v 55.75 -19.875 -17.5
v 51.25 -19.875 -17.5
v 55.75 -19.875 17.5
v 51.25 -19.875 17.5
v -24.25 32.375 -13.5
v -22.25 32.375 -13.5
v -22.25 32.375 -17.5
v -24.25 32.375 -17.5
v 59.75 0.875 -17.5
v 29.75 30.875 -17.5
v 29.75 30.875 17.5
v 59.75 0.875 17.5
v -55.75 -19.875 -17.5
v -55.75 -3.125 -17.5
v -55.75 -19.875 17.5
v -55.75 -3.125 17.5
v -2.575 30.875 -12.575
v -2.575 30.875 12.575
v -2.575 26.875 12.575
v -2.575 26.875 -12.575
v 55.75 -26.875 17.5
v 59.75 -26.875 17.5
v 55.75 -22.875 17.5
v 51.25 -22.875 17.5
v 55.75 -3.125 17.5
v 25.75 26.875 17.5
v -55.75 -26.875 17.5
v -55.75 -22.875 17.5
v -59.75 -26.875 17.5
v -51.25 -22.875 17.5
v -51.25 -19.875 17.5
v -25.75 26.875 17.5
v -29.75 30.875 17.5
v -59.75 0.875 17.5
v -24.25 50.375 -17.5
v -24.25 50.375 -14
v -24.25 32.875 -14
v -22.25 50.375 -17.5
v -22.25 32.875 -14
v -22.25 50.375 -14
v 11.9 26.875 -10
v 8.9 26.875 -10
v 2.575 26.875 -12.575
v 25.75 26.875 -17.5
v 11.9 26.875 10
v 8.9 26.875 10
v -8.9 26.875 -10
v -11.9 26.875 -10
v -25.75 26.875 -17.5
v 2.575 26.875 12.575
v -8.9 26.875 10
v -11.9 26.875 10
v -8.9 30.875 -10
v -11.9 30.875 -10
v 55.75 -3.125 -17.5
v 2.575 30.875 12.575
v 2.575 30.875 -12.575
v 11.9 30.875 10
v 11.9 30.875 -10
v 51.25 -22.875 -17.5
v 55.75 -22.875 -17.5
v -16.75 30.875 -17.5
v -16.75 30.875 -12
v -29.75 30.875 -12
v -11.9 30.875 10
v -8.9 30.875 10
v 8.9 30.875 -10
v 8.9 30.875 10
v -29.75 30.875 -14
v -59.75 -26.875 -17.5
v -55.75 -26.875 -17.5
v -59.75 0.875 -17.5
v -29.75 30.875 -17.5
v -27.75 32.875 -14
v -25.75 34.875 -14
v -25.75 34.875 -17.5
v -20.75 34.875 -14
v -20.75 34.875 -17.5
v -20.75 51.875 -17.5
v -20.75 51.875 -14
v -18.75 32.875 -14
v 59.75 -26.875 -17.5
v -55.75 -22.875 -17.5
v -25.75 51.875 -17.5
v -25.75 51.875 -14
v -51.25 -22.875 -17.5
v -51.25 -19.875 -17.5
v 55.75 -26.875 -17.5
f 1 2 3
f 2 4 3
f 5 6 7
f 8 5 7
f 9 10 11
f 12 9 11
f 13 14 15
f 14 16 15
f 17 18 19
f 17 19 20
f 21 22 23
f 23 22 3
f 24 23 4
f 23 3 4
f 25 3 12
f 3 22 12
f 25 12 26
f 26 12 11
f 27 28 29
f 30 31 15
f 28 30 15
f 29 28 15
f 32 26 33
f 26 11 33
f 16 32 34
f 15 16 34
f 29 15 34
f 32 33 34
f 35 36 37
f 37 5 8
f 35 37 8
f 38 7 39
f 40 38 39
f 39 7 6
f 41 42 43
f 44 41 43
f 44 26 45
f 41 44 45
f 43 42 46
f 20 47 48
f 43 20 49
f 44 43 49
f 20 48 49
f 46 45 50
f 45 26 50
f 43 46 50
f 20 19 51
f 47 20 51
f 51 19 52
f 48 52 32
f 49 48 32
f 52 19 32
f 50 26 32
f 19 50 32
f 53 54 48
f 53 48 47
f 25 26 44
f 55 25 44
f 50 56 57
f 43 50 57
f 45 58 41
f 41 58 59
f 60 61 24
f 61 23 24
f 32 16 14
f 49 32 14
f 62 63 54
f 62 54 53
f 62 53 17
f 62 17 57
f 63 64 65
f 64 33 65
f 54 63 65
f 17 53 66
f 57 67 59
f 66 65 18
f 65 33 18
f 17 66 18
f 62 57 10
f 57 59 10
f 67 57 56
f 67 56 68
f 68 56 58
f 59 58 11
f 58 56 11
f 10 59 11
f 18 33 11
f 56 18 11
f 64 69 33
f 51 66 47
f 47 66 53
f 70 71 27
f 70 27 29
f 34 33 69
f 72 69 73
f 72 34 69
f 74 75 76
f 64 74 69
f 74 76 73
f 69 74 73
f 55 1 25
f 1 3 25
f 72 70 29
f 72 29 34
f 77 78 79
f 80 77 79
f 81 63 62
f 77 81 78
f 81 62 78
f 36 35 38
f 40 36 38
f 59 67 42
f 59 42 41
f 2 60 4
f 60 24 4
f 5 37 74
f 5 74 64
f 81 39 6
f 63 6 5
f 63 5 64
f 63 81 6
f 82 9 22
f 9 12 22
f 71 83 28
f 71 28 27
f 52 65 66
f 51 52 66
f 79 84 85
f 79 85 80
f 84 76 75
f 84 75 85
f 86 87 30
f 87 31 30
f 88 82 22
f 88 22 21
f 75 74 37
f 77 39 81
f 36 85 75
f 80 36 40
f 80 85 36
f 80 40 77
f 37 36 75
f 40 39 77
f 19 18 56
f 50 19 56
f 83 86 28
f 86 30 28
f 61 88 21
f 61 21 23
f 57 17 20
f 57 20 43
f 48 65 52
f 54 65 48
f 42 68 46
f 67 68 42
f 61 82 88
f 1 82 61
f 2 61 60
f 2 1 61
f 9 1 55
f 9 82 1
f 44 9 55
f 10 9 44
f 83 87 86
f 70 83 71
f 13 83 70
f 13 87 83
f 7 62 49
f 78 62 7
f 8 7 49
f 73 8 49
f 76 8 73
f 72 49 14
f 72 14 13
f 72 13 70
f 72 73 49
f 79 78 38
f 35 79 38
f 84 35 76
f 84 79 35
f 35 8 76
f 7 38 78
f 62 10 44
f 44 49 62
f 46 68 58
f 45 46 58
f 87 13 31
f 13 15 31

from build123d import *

# Parameters (mm, degrees)
BOSS_EXTRUDE1_DEPTH = 17.5
CHAMFER1_SIZE       = 30
SKETCH6_W           = 5.15
SKETCH6_H           = 25.15
CUT_EXTRUDE2_DEPTH  = 4
SKETCH7_W           = 3
SKETCH7_H           = 20
CUT_EXTRUDE3_DEPTH  = 10
SKETCH8_W           = 5
SKETCH8_H           = 25
SKETCH8_W_2         = 2
SKETCH8_H_2         = 18
BOSS_EXTRUDE2_DEPTH = 3.5
CHAMFER2_SIZE       = 4
CHAMFER3_SIZE       = 2


# Some blends are built 0.0001 mm under size
with BuildPart() as part:
    # Sketch1 → Boss-Extrude1 (new, symmetric)
    with BuildSketch(Plane.XY):
        Polygon((55.75, -26.875), (55.75, -22.875), (51.25, -22.875), (51.25, -19.875), (55.75, -19.875), (55.75, 26.875), (-55.75, 26.875), (-55.75, -19.875), (-51.25, -19.875), (-51.25, -22.875), (-55.75, -22.875), (-55.75, -26.875), (-59.75, -26.875), (-59.75, 30.875), (59.75, 30.875), (59.75, -26.875), align=None)
    extrude(amount=BOSS_EXTRUDE1_DEPTH, both=True)

    # Chamfer1
    chamfer1_edges = [part.edges().sort_by_distance(p)[0] for p in [
        (-59.75, 30.875, 0),
        (59.75, 30.875, 0),
        (55.75, 26.875, 0),
        (-55.75, 26.875, 0),
    ]]
    chamfer(chamfer1_edges, length=CHAMFER1_SIZE)

    # Sketch6 → Cut-Extrude2 (cut)
    with BuildSketch(Plane(origin=(0, 30.875, 0), x_dir=(1, 0, 0), z_dir=(0, 1, 0))):
        Rectangle(SKETCH6_W, SKETCH6_H)
    extrude(amount=-CUT_EXTRUDE2_DEPTH, mode=Mode.SUBTRACT)

    # Sketch7 → Cut-Extrude3 (cut)
    with BuildSketch(Plane(origin=(0, 30.875, 0), x_dir=(1, 0, 0), z_dir=(0, 1, 0))):
        with Locations((10.4, 0)):
            Rectangle(SKETCH7_W, SKETCH7_H)
        with Locations((-10.4, 0)):
            Rectangle(SKETCH7_W, SKETCH7_H)
    extrude(amount=-CUT_EXTRUDE3_DEPTH, mode=Mode.SUBTRACT)

    # Sketch8 → Boss-Extrude2 (add)
    with BuildSketch(Plane.XY.offset(-17.5)):
        with Locations((-23.25, 39.375)):
            Rectangle(SKETCH8_W, SKETCH8_H)
        with Locations((-23.25, 41.375)):
            Rectangle(SKETCH8_W_2, SKETCH8_H_2, mode=Mode.SUBTRACT)
    extrude(amount=BOSS_EXTRUDE2_DEPTH)

    # Chamfer2
    chamfer2_edges = [part.edges().sort_by_distance(p)[0] for p in [
        (-20.75, 30.875, -15.75),
        (-25.75, 30.875, -15.75),
    ]]
    chamfer(chamfer2_edges, length=CHAMFER2_SIZE - 0.0001)  # a hair under: the kernel refuses the full size

    # Chamfer3
    # the kernel refuses this chamfer: 2 mm, written as the material it adds along each edge
    with BuildSketch(Plane(origin=(-11.606734024, 30.875, -14), x_dir=(0, 0.9996219169112968, -0.02749587661058651), z_dir=(-1, 0, 0))) as chamfer3_piece_1_section:
        Polygon((CHAMFER3_SIZE * 0.999621916911, -CHAMFER3_SIZE * 0.0274958766106), (-CHAMFER3_SIZE * 0.0274958766106, -CHAMFER3_SIZE * 0.999621916911), (0, 0), align=None)
    chamfer3_piece_1 = extrude(amount=23.286531952, mode=Mode.PRIVATE)
    chamfer3_piece_1 = split(chamfer3_piece_1, bisect_by=Plane(origin=(-22.25, 32.567452132, -13.881504022), z_dir=(1, 0, 0)), keep=Keep.TOP, mode=Mode.PRIVATE)
    chamfer3_piece_1 = split(chamfer3_piece_1, bisect_by=Plane(origin=(-19.394414099, 33.519314099, -13.881504022), z_dir=(-0.7071067811865476, -0.7071067811865476, 0)), keep=Keep.TOP, mode=Mode.PRIVATE)
    chamfer3_piece_1 = split(chamfer3_piece_1, bisect_by=Plane(origin=(-20.346276066, 32.375, -13.881504022), z_dir=(0, 1, 0)), keep=Keep.TOP, mode=Mode.PRIVATE)
    add(chamfer3_piece_1)
    with BuildSketch(Plane(origin=(-11.606734024, 30.875, -14), x_dir=(0, 0.9996219169112968, -0.02749587661058651), z_dir=(-1, 0, 0))) as chamfer3_piece_2_section:
        Polygon((CHAMFER3_SIZE * 0.999621916911, -CHAMFER3_SIZE * 0.0274958766106), (-CHAMFER3_SIZE * 0.0274958766106, -CHAMFER3_SIZE * 0.999621916911), (0, 0), align=None)
    chamfer3_piece_2 = extrude(amount=23.286531952, mode=Mode.PRIVATE)
    chamfer3_piece_2 = split(chamfer3_piece_2, bisect_by=Plane(origin=(-22.25, 31.41379866, -13.276536182), z_dir=(1, 0, 0)), keep=Keep.TOP, mode=Mode.PRIVATE)
    chamfer3_piece_2 = split(chamfer3_piece_2, bisect_by=Plane(origin=(-18.529173995, 32.654073995, -13.276536182), z_dir=(-0.7071067811865476, -0.7071067811865476, 0)), keep=Keep.TOP, mode=Mode.PRIVATE)
    chamfer3_piece_2 = split(chamfer3_piece_2, bisect_by=Plane(origin=(-19.76944933, 32.375, -13.276536182), z_dir=(0, -1, 0)), keep=Keep.TOP, mode=Mode.PRIVATE)
    add(chamfer3_piece_2)
    with BuildSketch(Plane(origin=(-11.606734024, 30.875, -14), x_dir=(0, 0.9996219169112968, -0.02749587661058651), z_dir=(-1, 0, 0))) as chamfer3_piece_3_section:
        Polygon((CHAMFER3_SIZE * 0.999621916911, -CHAMFER3_SIZE * 0.0274958766106), (-CHAMFER3_SIZE * 0.0274958766106, -CHAMFER3_SIZE * 0.999621916911), (0, 0), align=None)
    chamfer3_piece_3 = extrude(amount=23.286531952, mode=Mode.PRIVATE)
    chamfer3_piece_3 = split(chamfer3_piece_3, bisect_by=Plane(origin=(-22.25, 31.449972825, -13.29608178), z_dir=(-1, 0, 0)), keep=Keep.TOP, mode=Mode.PRIVATE)
    chamfer3_piece_3 = split(chamfer3_piece_3, bisect_by=Plane(origin=(-23.25, 32.375, -13.29608178), z_dir=(0, -1, 0)), keep=Keep.TOP, mode=Mode.PRIVATE)
    chamfer3_piece_3 = split(chamfer3_piece_3, bisect_by=Plane(origin=(-24.25, 31.449972825, -13.29608178), z_dir=(1, 0, 0)), keep=Keep.TOP, mode=Mode.PRIVATE)
    add(chamfer3_piece_3)
    with BuildSketch(Plane(origin=(-11.606734024, 30.875, -14), x_dir=(0, 0.9996219169112968, -0.02749587661058651), z_dir=(-1, 0, 0))) as chamfer3_piece_4_section:
        Polygon((CHAMFER3_SIZE * 0.999621916911, -CHAMFER3_SIZE * 0.0274958766106), (-CHAMFER3_SIZE * 0.0274958766106, -CHAMFER3_SIZE * 0.999621916911), (0, 0), align=None)
    chamfer3_piece_4 = extrude(amount=23.286531952, mode=Mode.PRIVATE)
    chamfer3_piece_4 = split(chamfer3_piece_4, bisect_by=Plane(origin=(-27.105585901, 33.519314099, -13.881504022), z_dir=(0.7071067811865472, -0.7071067811865478, 0)), keep=Keep.TOP, mode=Mode.PRIVATE)
    chamfer3_piece_4 = split(chamfer3_piece_4, bisect_by=Plane(origin=(-26.153723934, 32.375, -13.881504022), z_dir=(0, 1, 0)), keep=Keep.TOP, mode=Mode.PRIVATE)
    chamfer3_piece_4 = split(chamfer3_piece_4, bisect_by=Plane(origin=(-24.25, 32.567452132, -13.881504022), z_dir=(-1, 0, 0)), keep=Keep.TOP, mode=Mode.PRIVATE)
    add(chamfer3_piece_4)
    with BuildSketch(Plane(origin=(-11.606734024, 30.875, -14), x_dir=(0, 0.9996219169112968, -0.02749587661058651), z_dir=(-1, 0, 0))) as chamfer3_piece_5_section:
        Polygon((CHAMFER3_SIZE * 0.999621916911, -CHAMFER3_SIZE * 0.0274958766106), (-CHAMFER3_SIZE * 0.0274958766106, -CHAMFER3_SIZE * 0.999621916911), (0, 0), align=None)
    chamfer3_piece_5 = extrude(amount=23.286531952, mode=Mode.PRIVATE)
    chamfer3_piece_5 = split(chamfer3_piece_5, bisect_by=Plane(origin=(-27.970826005, 32.654073995, -13.276536182), z_dir=(0.7071067811865472, -0.7071067811865478, 0)), keep=Keep.TOP, mode=Mode.PRIVATE)
    chamfer3_piece_5 = split(chamfer3_piece_5, bisect_by=Plane(origin=(-26.73055067, 32.375, -13.276536182), z_dir=(0, -1, 0)), keep=Keep.TOP, mode=Mode.PRIVATE)
    chamfer3_piece_5 = split(chamfer3_piece_5, bisect_by=Plane(origin=(-24.25, 31.41379866, -13.276536182), z_dir=(-1, 0, 0)), keep=Keep.TOP, mode=Mode.PRIVATE)
    add(chamfer3_piece_5)


solid = part.part
